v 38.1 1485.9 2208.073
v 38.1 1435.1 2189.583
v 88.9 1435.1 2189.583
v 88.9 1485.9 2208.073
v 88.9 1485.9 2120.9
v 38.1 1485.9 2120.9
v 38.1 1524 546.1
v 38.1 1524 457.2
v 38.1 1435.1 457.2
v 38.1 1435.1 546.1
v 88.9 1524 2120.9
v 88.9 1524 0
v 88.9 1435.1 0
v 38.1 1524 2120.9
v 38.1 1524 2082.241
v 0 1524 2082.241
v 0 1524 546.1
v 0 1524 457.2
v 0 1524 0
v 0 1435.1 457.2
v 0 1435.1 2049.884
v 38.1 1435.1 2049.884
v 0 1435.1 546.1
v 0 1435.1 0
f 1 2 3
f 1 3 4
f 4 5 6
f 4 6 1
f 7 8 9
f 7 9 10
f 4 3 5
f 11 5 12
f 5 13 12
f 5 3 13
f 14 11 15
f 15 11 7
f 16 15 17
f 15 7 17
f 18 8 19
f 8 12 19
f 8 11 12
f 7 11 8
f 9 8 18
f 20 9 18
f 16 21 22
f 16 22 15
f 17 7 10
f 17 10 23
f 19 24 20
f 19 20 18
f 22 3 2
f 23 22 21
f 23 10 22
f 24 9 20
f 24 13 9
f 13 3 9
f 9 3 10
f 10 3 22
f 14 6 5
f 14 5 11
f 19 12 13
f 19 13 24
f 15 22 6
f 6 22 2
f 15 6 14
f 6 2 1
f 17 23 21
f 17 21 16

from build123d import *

# Parameters (mm, degrees)
BOX006_W        = 88.9
BOX006_H        = 88.9
BOX006_DEPTH    = 2438.4
SKETCH003_W     = 38.1
SKETCH003_H     = 88.9
POCKET003_DEPTH = 88.9010000032
POCKET009_DEPTH = 88.901
POCKET013_DEPTH = 38.1
SKETCH018_W     = 38.1
SKETCH018_H     = 101.6
POCKET015_DEPTH = 88.901


with BuildPart() as nepost2:
    # Box006 → Box006 (new body)
    with BuildSketch(Plane(origin=(1435.1, 1435.1, 0), x_dir=(1, 0, 0), z_dir=(0, 0, 1))):
        with Locations((44.45, 44.45)):
            Rectangle(BOX006_W, BOX006_H)
    extrude(amount=BOX006_DEPTH)

    # Sketch003 → Pocket003 (cut, through all)
    with BuildSketch(Plane(origin=(1435.1, 1435.1, 0), x_dir=(1, 0, 0), z_dir=(0, -1, 0))):
        with Locations((69.85, 501.65)):
            Rectangle(SKETCH003_W, SKETCH003_H)
    extrude(amount=-POCKET003_DEPTH, mode=Mode.SUBTRACT)


with BuildPart() as pocket015:
    # Part__Mirroring: instance of NEpost2
    add(nepost2.part.mirror(Plane(origin=(762, 0, 0), x_dir=(0, -1, 0), z_dir=(1, 0, 0))))

    # Sketch010 → Pocket009 (cut, through all)
    with BuildSketch(Plane(origin=(0, 0, 0), x_dir=(0, -1, 0), z_dir=(-1, 0, 0))):
        Polygon((-1524.003048, 2221.9412), (-1524.003048, 2438.4), (-1434.087048, 2438.4), (-1434.087048, 2189.2144524157), align=None)
    extrude(amount=-POCKET009_DEPTH, mode=Mode.SUBTRACT)

    # Sketch014 → Pocket013 (cut)
    with BuildSketch(Plane(origin=(0, 0, 0), x_dir=(0, -1, 0), z_dir=(-1, 0, 0))):
        Polygon((-1524, 2221.9412), (-1435.1, 2189.5842461737), (-1435.1, 2049.8842461737), (-1524, 2082.2412), align=None)
    extrude(amount=-POCKET013_DEPTH, mode=Mode.SUBTRACT)

    # Sketch018 → Pocket015 (cut, through all)
    with BuildSketch(Plane.YZ.offset(88.9)):
        with Locations((1504.95, 2171.7)):
            Rectangle(SKETCH018_W, SKETCH018_H)
    extrude(amount=-POCKET015_DEPTH, mode=Mode.SUBTRACT)


solid = pocket015.part
